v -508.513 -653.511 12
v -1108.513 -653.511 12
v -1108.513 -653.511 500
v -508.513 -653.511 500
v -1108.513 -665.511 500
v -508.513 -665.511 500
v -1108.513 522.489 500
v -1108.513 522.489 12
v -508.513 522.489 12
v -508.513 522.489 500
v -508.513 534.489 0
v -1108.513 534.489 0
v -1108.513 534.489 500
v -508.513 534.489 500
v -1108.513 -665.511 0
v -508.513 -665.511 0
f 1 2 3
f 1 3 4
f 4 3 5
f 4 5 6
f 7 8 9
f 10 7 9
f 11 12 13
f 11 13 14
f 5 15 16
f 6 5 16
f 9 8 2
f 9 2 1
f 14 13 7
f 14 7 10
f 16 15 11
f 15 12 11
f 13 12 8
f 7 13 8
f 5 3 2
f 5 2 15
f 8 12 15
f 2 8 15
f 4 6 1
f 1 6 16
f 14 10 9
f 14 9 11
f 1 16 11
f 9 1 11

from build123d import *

# Parameters (mm, degrees)
F0_W     = 600
F0_H     = 12
F1_DEPTH = 500
F2_DEPTH = 12


with BuildPart() as f1:
    # F0 (on Top) → F1 (new body)
    with BuildSketch(Plane.XY):
        with Locations((-808.5126264931, 528.488914907)):
            Rectangle(F0_W, F0_H)
    extrude(amount=F1_DEPTH)



with BuildPart() as f1b:
    # F0 (on Top) → F1, piece 2 (new body)
    with BuildSketch(Plane.XY):
        with Locations((-808.5126264931, -659.511085093)):
            Rectangle(F0_W, F0_H)
    extrude(amount=F1_DEPTH)


with BuildPart() as f1_1:
    add(f1.part)

    add(f1b.part)  # F2 merges F1b
    # F0 (on Top) → F2 (join)
    with BuildSketch(Plane.XY):
        Polygon((-508.5126264931, 522.488914907), (-1108.5126264931, 522.488914907), (-1108.5126264931, -653.511085093), (-508.5126264931, -653.511085093), (-508.5126264931, -609.109044075), align=None)
    extrude(amount=F2_DEPTH)


solid = f1_1.part
